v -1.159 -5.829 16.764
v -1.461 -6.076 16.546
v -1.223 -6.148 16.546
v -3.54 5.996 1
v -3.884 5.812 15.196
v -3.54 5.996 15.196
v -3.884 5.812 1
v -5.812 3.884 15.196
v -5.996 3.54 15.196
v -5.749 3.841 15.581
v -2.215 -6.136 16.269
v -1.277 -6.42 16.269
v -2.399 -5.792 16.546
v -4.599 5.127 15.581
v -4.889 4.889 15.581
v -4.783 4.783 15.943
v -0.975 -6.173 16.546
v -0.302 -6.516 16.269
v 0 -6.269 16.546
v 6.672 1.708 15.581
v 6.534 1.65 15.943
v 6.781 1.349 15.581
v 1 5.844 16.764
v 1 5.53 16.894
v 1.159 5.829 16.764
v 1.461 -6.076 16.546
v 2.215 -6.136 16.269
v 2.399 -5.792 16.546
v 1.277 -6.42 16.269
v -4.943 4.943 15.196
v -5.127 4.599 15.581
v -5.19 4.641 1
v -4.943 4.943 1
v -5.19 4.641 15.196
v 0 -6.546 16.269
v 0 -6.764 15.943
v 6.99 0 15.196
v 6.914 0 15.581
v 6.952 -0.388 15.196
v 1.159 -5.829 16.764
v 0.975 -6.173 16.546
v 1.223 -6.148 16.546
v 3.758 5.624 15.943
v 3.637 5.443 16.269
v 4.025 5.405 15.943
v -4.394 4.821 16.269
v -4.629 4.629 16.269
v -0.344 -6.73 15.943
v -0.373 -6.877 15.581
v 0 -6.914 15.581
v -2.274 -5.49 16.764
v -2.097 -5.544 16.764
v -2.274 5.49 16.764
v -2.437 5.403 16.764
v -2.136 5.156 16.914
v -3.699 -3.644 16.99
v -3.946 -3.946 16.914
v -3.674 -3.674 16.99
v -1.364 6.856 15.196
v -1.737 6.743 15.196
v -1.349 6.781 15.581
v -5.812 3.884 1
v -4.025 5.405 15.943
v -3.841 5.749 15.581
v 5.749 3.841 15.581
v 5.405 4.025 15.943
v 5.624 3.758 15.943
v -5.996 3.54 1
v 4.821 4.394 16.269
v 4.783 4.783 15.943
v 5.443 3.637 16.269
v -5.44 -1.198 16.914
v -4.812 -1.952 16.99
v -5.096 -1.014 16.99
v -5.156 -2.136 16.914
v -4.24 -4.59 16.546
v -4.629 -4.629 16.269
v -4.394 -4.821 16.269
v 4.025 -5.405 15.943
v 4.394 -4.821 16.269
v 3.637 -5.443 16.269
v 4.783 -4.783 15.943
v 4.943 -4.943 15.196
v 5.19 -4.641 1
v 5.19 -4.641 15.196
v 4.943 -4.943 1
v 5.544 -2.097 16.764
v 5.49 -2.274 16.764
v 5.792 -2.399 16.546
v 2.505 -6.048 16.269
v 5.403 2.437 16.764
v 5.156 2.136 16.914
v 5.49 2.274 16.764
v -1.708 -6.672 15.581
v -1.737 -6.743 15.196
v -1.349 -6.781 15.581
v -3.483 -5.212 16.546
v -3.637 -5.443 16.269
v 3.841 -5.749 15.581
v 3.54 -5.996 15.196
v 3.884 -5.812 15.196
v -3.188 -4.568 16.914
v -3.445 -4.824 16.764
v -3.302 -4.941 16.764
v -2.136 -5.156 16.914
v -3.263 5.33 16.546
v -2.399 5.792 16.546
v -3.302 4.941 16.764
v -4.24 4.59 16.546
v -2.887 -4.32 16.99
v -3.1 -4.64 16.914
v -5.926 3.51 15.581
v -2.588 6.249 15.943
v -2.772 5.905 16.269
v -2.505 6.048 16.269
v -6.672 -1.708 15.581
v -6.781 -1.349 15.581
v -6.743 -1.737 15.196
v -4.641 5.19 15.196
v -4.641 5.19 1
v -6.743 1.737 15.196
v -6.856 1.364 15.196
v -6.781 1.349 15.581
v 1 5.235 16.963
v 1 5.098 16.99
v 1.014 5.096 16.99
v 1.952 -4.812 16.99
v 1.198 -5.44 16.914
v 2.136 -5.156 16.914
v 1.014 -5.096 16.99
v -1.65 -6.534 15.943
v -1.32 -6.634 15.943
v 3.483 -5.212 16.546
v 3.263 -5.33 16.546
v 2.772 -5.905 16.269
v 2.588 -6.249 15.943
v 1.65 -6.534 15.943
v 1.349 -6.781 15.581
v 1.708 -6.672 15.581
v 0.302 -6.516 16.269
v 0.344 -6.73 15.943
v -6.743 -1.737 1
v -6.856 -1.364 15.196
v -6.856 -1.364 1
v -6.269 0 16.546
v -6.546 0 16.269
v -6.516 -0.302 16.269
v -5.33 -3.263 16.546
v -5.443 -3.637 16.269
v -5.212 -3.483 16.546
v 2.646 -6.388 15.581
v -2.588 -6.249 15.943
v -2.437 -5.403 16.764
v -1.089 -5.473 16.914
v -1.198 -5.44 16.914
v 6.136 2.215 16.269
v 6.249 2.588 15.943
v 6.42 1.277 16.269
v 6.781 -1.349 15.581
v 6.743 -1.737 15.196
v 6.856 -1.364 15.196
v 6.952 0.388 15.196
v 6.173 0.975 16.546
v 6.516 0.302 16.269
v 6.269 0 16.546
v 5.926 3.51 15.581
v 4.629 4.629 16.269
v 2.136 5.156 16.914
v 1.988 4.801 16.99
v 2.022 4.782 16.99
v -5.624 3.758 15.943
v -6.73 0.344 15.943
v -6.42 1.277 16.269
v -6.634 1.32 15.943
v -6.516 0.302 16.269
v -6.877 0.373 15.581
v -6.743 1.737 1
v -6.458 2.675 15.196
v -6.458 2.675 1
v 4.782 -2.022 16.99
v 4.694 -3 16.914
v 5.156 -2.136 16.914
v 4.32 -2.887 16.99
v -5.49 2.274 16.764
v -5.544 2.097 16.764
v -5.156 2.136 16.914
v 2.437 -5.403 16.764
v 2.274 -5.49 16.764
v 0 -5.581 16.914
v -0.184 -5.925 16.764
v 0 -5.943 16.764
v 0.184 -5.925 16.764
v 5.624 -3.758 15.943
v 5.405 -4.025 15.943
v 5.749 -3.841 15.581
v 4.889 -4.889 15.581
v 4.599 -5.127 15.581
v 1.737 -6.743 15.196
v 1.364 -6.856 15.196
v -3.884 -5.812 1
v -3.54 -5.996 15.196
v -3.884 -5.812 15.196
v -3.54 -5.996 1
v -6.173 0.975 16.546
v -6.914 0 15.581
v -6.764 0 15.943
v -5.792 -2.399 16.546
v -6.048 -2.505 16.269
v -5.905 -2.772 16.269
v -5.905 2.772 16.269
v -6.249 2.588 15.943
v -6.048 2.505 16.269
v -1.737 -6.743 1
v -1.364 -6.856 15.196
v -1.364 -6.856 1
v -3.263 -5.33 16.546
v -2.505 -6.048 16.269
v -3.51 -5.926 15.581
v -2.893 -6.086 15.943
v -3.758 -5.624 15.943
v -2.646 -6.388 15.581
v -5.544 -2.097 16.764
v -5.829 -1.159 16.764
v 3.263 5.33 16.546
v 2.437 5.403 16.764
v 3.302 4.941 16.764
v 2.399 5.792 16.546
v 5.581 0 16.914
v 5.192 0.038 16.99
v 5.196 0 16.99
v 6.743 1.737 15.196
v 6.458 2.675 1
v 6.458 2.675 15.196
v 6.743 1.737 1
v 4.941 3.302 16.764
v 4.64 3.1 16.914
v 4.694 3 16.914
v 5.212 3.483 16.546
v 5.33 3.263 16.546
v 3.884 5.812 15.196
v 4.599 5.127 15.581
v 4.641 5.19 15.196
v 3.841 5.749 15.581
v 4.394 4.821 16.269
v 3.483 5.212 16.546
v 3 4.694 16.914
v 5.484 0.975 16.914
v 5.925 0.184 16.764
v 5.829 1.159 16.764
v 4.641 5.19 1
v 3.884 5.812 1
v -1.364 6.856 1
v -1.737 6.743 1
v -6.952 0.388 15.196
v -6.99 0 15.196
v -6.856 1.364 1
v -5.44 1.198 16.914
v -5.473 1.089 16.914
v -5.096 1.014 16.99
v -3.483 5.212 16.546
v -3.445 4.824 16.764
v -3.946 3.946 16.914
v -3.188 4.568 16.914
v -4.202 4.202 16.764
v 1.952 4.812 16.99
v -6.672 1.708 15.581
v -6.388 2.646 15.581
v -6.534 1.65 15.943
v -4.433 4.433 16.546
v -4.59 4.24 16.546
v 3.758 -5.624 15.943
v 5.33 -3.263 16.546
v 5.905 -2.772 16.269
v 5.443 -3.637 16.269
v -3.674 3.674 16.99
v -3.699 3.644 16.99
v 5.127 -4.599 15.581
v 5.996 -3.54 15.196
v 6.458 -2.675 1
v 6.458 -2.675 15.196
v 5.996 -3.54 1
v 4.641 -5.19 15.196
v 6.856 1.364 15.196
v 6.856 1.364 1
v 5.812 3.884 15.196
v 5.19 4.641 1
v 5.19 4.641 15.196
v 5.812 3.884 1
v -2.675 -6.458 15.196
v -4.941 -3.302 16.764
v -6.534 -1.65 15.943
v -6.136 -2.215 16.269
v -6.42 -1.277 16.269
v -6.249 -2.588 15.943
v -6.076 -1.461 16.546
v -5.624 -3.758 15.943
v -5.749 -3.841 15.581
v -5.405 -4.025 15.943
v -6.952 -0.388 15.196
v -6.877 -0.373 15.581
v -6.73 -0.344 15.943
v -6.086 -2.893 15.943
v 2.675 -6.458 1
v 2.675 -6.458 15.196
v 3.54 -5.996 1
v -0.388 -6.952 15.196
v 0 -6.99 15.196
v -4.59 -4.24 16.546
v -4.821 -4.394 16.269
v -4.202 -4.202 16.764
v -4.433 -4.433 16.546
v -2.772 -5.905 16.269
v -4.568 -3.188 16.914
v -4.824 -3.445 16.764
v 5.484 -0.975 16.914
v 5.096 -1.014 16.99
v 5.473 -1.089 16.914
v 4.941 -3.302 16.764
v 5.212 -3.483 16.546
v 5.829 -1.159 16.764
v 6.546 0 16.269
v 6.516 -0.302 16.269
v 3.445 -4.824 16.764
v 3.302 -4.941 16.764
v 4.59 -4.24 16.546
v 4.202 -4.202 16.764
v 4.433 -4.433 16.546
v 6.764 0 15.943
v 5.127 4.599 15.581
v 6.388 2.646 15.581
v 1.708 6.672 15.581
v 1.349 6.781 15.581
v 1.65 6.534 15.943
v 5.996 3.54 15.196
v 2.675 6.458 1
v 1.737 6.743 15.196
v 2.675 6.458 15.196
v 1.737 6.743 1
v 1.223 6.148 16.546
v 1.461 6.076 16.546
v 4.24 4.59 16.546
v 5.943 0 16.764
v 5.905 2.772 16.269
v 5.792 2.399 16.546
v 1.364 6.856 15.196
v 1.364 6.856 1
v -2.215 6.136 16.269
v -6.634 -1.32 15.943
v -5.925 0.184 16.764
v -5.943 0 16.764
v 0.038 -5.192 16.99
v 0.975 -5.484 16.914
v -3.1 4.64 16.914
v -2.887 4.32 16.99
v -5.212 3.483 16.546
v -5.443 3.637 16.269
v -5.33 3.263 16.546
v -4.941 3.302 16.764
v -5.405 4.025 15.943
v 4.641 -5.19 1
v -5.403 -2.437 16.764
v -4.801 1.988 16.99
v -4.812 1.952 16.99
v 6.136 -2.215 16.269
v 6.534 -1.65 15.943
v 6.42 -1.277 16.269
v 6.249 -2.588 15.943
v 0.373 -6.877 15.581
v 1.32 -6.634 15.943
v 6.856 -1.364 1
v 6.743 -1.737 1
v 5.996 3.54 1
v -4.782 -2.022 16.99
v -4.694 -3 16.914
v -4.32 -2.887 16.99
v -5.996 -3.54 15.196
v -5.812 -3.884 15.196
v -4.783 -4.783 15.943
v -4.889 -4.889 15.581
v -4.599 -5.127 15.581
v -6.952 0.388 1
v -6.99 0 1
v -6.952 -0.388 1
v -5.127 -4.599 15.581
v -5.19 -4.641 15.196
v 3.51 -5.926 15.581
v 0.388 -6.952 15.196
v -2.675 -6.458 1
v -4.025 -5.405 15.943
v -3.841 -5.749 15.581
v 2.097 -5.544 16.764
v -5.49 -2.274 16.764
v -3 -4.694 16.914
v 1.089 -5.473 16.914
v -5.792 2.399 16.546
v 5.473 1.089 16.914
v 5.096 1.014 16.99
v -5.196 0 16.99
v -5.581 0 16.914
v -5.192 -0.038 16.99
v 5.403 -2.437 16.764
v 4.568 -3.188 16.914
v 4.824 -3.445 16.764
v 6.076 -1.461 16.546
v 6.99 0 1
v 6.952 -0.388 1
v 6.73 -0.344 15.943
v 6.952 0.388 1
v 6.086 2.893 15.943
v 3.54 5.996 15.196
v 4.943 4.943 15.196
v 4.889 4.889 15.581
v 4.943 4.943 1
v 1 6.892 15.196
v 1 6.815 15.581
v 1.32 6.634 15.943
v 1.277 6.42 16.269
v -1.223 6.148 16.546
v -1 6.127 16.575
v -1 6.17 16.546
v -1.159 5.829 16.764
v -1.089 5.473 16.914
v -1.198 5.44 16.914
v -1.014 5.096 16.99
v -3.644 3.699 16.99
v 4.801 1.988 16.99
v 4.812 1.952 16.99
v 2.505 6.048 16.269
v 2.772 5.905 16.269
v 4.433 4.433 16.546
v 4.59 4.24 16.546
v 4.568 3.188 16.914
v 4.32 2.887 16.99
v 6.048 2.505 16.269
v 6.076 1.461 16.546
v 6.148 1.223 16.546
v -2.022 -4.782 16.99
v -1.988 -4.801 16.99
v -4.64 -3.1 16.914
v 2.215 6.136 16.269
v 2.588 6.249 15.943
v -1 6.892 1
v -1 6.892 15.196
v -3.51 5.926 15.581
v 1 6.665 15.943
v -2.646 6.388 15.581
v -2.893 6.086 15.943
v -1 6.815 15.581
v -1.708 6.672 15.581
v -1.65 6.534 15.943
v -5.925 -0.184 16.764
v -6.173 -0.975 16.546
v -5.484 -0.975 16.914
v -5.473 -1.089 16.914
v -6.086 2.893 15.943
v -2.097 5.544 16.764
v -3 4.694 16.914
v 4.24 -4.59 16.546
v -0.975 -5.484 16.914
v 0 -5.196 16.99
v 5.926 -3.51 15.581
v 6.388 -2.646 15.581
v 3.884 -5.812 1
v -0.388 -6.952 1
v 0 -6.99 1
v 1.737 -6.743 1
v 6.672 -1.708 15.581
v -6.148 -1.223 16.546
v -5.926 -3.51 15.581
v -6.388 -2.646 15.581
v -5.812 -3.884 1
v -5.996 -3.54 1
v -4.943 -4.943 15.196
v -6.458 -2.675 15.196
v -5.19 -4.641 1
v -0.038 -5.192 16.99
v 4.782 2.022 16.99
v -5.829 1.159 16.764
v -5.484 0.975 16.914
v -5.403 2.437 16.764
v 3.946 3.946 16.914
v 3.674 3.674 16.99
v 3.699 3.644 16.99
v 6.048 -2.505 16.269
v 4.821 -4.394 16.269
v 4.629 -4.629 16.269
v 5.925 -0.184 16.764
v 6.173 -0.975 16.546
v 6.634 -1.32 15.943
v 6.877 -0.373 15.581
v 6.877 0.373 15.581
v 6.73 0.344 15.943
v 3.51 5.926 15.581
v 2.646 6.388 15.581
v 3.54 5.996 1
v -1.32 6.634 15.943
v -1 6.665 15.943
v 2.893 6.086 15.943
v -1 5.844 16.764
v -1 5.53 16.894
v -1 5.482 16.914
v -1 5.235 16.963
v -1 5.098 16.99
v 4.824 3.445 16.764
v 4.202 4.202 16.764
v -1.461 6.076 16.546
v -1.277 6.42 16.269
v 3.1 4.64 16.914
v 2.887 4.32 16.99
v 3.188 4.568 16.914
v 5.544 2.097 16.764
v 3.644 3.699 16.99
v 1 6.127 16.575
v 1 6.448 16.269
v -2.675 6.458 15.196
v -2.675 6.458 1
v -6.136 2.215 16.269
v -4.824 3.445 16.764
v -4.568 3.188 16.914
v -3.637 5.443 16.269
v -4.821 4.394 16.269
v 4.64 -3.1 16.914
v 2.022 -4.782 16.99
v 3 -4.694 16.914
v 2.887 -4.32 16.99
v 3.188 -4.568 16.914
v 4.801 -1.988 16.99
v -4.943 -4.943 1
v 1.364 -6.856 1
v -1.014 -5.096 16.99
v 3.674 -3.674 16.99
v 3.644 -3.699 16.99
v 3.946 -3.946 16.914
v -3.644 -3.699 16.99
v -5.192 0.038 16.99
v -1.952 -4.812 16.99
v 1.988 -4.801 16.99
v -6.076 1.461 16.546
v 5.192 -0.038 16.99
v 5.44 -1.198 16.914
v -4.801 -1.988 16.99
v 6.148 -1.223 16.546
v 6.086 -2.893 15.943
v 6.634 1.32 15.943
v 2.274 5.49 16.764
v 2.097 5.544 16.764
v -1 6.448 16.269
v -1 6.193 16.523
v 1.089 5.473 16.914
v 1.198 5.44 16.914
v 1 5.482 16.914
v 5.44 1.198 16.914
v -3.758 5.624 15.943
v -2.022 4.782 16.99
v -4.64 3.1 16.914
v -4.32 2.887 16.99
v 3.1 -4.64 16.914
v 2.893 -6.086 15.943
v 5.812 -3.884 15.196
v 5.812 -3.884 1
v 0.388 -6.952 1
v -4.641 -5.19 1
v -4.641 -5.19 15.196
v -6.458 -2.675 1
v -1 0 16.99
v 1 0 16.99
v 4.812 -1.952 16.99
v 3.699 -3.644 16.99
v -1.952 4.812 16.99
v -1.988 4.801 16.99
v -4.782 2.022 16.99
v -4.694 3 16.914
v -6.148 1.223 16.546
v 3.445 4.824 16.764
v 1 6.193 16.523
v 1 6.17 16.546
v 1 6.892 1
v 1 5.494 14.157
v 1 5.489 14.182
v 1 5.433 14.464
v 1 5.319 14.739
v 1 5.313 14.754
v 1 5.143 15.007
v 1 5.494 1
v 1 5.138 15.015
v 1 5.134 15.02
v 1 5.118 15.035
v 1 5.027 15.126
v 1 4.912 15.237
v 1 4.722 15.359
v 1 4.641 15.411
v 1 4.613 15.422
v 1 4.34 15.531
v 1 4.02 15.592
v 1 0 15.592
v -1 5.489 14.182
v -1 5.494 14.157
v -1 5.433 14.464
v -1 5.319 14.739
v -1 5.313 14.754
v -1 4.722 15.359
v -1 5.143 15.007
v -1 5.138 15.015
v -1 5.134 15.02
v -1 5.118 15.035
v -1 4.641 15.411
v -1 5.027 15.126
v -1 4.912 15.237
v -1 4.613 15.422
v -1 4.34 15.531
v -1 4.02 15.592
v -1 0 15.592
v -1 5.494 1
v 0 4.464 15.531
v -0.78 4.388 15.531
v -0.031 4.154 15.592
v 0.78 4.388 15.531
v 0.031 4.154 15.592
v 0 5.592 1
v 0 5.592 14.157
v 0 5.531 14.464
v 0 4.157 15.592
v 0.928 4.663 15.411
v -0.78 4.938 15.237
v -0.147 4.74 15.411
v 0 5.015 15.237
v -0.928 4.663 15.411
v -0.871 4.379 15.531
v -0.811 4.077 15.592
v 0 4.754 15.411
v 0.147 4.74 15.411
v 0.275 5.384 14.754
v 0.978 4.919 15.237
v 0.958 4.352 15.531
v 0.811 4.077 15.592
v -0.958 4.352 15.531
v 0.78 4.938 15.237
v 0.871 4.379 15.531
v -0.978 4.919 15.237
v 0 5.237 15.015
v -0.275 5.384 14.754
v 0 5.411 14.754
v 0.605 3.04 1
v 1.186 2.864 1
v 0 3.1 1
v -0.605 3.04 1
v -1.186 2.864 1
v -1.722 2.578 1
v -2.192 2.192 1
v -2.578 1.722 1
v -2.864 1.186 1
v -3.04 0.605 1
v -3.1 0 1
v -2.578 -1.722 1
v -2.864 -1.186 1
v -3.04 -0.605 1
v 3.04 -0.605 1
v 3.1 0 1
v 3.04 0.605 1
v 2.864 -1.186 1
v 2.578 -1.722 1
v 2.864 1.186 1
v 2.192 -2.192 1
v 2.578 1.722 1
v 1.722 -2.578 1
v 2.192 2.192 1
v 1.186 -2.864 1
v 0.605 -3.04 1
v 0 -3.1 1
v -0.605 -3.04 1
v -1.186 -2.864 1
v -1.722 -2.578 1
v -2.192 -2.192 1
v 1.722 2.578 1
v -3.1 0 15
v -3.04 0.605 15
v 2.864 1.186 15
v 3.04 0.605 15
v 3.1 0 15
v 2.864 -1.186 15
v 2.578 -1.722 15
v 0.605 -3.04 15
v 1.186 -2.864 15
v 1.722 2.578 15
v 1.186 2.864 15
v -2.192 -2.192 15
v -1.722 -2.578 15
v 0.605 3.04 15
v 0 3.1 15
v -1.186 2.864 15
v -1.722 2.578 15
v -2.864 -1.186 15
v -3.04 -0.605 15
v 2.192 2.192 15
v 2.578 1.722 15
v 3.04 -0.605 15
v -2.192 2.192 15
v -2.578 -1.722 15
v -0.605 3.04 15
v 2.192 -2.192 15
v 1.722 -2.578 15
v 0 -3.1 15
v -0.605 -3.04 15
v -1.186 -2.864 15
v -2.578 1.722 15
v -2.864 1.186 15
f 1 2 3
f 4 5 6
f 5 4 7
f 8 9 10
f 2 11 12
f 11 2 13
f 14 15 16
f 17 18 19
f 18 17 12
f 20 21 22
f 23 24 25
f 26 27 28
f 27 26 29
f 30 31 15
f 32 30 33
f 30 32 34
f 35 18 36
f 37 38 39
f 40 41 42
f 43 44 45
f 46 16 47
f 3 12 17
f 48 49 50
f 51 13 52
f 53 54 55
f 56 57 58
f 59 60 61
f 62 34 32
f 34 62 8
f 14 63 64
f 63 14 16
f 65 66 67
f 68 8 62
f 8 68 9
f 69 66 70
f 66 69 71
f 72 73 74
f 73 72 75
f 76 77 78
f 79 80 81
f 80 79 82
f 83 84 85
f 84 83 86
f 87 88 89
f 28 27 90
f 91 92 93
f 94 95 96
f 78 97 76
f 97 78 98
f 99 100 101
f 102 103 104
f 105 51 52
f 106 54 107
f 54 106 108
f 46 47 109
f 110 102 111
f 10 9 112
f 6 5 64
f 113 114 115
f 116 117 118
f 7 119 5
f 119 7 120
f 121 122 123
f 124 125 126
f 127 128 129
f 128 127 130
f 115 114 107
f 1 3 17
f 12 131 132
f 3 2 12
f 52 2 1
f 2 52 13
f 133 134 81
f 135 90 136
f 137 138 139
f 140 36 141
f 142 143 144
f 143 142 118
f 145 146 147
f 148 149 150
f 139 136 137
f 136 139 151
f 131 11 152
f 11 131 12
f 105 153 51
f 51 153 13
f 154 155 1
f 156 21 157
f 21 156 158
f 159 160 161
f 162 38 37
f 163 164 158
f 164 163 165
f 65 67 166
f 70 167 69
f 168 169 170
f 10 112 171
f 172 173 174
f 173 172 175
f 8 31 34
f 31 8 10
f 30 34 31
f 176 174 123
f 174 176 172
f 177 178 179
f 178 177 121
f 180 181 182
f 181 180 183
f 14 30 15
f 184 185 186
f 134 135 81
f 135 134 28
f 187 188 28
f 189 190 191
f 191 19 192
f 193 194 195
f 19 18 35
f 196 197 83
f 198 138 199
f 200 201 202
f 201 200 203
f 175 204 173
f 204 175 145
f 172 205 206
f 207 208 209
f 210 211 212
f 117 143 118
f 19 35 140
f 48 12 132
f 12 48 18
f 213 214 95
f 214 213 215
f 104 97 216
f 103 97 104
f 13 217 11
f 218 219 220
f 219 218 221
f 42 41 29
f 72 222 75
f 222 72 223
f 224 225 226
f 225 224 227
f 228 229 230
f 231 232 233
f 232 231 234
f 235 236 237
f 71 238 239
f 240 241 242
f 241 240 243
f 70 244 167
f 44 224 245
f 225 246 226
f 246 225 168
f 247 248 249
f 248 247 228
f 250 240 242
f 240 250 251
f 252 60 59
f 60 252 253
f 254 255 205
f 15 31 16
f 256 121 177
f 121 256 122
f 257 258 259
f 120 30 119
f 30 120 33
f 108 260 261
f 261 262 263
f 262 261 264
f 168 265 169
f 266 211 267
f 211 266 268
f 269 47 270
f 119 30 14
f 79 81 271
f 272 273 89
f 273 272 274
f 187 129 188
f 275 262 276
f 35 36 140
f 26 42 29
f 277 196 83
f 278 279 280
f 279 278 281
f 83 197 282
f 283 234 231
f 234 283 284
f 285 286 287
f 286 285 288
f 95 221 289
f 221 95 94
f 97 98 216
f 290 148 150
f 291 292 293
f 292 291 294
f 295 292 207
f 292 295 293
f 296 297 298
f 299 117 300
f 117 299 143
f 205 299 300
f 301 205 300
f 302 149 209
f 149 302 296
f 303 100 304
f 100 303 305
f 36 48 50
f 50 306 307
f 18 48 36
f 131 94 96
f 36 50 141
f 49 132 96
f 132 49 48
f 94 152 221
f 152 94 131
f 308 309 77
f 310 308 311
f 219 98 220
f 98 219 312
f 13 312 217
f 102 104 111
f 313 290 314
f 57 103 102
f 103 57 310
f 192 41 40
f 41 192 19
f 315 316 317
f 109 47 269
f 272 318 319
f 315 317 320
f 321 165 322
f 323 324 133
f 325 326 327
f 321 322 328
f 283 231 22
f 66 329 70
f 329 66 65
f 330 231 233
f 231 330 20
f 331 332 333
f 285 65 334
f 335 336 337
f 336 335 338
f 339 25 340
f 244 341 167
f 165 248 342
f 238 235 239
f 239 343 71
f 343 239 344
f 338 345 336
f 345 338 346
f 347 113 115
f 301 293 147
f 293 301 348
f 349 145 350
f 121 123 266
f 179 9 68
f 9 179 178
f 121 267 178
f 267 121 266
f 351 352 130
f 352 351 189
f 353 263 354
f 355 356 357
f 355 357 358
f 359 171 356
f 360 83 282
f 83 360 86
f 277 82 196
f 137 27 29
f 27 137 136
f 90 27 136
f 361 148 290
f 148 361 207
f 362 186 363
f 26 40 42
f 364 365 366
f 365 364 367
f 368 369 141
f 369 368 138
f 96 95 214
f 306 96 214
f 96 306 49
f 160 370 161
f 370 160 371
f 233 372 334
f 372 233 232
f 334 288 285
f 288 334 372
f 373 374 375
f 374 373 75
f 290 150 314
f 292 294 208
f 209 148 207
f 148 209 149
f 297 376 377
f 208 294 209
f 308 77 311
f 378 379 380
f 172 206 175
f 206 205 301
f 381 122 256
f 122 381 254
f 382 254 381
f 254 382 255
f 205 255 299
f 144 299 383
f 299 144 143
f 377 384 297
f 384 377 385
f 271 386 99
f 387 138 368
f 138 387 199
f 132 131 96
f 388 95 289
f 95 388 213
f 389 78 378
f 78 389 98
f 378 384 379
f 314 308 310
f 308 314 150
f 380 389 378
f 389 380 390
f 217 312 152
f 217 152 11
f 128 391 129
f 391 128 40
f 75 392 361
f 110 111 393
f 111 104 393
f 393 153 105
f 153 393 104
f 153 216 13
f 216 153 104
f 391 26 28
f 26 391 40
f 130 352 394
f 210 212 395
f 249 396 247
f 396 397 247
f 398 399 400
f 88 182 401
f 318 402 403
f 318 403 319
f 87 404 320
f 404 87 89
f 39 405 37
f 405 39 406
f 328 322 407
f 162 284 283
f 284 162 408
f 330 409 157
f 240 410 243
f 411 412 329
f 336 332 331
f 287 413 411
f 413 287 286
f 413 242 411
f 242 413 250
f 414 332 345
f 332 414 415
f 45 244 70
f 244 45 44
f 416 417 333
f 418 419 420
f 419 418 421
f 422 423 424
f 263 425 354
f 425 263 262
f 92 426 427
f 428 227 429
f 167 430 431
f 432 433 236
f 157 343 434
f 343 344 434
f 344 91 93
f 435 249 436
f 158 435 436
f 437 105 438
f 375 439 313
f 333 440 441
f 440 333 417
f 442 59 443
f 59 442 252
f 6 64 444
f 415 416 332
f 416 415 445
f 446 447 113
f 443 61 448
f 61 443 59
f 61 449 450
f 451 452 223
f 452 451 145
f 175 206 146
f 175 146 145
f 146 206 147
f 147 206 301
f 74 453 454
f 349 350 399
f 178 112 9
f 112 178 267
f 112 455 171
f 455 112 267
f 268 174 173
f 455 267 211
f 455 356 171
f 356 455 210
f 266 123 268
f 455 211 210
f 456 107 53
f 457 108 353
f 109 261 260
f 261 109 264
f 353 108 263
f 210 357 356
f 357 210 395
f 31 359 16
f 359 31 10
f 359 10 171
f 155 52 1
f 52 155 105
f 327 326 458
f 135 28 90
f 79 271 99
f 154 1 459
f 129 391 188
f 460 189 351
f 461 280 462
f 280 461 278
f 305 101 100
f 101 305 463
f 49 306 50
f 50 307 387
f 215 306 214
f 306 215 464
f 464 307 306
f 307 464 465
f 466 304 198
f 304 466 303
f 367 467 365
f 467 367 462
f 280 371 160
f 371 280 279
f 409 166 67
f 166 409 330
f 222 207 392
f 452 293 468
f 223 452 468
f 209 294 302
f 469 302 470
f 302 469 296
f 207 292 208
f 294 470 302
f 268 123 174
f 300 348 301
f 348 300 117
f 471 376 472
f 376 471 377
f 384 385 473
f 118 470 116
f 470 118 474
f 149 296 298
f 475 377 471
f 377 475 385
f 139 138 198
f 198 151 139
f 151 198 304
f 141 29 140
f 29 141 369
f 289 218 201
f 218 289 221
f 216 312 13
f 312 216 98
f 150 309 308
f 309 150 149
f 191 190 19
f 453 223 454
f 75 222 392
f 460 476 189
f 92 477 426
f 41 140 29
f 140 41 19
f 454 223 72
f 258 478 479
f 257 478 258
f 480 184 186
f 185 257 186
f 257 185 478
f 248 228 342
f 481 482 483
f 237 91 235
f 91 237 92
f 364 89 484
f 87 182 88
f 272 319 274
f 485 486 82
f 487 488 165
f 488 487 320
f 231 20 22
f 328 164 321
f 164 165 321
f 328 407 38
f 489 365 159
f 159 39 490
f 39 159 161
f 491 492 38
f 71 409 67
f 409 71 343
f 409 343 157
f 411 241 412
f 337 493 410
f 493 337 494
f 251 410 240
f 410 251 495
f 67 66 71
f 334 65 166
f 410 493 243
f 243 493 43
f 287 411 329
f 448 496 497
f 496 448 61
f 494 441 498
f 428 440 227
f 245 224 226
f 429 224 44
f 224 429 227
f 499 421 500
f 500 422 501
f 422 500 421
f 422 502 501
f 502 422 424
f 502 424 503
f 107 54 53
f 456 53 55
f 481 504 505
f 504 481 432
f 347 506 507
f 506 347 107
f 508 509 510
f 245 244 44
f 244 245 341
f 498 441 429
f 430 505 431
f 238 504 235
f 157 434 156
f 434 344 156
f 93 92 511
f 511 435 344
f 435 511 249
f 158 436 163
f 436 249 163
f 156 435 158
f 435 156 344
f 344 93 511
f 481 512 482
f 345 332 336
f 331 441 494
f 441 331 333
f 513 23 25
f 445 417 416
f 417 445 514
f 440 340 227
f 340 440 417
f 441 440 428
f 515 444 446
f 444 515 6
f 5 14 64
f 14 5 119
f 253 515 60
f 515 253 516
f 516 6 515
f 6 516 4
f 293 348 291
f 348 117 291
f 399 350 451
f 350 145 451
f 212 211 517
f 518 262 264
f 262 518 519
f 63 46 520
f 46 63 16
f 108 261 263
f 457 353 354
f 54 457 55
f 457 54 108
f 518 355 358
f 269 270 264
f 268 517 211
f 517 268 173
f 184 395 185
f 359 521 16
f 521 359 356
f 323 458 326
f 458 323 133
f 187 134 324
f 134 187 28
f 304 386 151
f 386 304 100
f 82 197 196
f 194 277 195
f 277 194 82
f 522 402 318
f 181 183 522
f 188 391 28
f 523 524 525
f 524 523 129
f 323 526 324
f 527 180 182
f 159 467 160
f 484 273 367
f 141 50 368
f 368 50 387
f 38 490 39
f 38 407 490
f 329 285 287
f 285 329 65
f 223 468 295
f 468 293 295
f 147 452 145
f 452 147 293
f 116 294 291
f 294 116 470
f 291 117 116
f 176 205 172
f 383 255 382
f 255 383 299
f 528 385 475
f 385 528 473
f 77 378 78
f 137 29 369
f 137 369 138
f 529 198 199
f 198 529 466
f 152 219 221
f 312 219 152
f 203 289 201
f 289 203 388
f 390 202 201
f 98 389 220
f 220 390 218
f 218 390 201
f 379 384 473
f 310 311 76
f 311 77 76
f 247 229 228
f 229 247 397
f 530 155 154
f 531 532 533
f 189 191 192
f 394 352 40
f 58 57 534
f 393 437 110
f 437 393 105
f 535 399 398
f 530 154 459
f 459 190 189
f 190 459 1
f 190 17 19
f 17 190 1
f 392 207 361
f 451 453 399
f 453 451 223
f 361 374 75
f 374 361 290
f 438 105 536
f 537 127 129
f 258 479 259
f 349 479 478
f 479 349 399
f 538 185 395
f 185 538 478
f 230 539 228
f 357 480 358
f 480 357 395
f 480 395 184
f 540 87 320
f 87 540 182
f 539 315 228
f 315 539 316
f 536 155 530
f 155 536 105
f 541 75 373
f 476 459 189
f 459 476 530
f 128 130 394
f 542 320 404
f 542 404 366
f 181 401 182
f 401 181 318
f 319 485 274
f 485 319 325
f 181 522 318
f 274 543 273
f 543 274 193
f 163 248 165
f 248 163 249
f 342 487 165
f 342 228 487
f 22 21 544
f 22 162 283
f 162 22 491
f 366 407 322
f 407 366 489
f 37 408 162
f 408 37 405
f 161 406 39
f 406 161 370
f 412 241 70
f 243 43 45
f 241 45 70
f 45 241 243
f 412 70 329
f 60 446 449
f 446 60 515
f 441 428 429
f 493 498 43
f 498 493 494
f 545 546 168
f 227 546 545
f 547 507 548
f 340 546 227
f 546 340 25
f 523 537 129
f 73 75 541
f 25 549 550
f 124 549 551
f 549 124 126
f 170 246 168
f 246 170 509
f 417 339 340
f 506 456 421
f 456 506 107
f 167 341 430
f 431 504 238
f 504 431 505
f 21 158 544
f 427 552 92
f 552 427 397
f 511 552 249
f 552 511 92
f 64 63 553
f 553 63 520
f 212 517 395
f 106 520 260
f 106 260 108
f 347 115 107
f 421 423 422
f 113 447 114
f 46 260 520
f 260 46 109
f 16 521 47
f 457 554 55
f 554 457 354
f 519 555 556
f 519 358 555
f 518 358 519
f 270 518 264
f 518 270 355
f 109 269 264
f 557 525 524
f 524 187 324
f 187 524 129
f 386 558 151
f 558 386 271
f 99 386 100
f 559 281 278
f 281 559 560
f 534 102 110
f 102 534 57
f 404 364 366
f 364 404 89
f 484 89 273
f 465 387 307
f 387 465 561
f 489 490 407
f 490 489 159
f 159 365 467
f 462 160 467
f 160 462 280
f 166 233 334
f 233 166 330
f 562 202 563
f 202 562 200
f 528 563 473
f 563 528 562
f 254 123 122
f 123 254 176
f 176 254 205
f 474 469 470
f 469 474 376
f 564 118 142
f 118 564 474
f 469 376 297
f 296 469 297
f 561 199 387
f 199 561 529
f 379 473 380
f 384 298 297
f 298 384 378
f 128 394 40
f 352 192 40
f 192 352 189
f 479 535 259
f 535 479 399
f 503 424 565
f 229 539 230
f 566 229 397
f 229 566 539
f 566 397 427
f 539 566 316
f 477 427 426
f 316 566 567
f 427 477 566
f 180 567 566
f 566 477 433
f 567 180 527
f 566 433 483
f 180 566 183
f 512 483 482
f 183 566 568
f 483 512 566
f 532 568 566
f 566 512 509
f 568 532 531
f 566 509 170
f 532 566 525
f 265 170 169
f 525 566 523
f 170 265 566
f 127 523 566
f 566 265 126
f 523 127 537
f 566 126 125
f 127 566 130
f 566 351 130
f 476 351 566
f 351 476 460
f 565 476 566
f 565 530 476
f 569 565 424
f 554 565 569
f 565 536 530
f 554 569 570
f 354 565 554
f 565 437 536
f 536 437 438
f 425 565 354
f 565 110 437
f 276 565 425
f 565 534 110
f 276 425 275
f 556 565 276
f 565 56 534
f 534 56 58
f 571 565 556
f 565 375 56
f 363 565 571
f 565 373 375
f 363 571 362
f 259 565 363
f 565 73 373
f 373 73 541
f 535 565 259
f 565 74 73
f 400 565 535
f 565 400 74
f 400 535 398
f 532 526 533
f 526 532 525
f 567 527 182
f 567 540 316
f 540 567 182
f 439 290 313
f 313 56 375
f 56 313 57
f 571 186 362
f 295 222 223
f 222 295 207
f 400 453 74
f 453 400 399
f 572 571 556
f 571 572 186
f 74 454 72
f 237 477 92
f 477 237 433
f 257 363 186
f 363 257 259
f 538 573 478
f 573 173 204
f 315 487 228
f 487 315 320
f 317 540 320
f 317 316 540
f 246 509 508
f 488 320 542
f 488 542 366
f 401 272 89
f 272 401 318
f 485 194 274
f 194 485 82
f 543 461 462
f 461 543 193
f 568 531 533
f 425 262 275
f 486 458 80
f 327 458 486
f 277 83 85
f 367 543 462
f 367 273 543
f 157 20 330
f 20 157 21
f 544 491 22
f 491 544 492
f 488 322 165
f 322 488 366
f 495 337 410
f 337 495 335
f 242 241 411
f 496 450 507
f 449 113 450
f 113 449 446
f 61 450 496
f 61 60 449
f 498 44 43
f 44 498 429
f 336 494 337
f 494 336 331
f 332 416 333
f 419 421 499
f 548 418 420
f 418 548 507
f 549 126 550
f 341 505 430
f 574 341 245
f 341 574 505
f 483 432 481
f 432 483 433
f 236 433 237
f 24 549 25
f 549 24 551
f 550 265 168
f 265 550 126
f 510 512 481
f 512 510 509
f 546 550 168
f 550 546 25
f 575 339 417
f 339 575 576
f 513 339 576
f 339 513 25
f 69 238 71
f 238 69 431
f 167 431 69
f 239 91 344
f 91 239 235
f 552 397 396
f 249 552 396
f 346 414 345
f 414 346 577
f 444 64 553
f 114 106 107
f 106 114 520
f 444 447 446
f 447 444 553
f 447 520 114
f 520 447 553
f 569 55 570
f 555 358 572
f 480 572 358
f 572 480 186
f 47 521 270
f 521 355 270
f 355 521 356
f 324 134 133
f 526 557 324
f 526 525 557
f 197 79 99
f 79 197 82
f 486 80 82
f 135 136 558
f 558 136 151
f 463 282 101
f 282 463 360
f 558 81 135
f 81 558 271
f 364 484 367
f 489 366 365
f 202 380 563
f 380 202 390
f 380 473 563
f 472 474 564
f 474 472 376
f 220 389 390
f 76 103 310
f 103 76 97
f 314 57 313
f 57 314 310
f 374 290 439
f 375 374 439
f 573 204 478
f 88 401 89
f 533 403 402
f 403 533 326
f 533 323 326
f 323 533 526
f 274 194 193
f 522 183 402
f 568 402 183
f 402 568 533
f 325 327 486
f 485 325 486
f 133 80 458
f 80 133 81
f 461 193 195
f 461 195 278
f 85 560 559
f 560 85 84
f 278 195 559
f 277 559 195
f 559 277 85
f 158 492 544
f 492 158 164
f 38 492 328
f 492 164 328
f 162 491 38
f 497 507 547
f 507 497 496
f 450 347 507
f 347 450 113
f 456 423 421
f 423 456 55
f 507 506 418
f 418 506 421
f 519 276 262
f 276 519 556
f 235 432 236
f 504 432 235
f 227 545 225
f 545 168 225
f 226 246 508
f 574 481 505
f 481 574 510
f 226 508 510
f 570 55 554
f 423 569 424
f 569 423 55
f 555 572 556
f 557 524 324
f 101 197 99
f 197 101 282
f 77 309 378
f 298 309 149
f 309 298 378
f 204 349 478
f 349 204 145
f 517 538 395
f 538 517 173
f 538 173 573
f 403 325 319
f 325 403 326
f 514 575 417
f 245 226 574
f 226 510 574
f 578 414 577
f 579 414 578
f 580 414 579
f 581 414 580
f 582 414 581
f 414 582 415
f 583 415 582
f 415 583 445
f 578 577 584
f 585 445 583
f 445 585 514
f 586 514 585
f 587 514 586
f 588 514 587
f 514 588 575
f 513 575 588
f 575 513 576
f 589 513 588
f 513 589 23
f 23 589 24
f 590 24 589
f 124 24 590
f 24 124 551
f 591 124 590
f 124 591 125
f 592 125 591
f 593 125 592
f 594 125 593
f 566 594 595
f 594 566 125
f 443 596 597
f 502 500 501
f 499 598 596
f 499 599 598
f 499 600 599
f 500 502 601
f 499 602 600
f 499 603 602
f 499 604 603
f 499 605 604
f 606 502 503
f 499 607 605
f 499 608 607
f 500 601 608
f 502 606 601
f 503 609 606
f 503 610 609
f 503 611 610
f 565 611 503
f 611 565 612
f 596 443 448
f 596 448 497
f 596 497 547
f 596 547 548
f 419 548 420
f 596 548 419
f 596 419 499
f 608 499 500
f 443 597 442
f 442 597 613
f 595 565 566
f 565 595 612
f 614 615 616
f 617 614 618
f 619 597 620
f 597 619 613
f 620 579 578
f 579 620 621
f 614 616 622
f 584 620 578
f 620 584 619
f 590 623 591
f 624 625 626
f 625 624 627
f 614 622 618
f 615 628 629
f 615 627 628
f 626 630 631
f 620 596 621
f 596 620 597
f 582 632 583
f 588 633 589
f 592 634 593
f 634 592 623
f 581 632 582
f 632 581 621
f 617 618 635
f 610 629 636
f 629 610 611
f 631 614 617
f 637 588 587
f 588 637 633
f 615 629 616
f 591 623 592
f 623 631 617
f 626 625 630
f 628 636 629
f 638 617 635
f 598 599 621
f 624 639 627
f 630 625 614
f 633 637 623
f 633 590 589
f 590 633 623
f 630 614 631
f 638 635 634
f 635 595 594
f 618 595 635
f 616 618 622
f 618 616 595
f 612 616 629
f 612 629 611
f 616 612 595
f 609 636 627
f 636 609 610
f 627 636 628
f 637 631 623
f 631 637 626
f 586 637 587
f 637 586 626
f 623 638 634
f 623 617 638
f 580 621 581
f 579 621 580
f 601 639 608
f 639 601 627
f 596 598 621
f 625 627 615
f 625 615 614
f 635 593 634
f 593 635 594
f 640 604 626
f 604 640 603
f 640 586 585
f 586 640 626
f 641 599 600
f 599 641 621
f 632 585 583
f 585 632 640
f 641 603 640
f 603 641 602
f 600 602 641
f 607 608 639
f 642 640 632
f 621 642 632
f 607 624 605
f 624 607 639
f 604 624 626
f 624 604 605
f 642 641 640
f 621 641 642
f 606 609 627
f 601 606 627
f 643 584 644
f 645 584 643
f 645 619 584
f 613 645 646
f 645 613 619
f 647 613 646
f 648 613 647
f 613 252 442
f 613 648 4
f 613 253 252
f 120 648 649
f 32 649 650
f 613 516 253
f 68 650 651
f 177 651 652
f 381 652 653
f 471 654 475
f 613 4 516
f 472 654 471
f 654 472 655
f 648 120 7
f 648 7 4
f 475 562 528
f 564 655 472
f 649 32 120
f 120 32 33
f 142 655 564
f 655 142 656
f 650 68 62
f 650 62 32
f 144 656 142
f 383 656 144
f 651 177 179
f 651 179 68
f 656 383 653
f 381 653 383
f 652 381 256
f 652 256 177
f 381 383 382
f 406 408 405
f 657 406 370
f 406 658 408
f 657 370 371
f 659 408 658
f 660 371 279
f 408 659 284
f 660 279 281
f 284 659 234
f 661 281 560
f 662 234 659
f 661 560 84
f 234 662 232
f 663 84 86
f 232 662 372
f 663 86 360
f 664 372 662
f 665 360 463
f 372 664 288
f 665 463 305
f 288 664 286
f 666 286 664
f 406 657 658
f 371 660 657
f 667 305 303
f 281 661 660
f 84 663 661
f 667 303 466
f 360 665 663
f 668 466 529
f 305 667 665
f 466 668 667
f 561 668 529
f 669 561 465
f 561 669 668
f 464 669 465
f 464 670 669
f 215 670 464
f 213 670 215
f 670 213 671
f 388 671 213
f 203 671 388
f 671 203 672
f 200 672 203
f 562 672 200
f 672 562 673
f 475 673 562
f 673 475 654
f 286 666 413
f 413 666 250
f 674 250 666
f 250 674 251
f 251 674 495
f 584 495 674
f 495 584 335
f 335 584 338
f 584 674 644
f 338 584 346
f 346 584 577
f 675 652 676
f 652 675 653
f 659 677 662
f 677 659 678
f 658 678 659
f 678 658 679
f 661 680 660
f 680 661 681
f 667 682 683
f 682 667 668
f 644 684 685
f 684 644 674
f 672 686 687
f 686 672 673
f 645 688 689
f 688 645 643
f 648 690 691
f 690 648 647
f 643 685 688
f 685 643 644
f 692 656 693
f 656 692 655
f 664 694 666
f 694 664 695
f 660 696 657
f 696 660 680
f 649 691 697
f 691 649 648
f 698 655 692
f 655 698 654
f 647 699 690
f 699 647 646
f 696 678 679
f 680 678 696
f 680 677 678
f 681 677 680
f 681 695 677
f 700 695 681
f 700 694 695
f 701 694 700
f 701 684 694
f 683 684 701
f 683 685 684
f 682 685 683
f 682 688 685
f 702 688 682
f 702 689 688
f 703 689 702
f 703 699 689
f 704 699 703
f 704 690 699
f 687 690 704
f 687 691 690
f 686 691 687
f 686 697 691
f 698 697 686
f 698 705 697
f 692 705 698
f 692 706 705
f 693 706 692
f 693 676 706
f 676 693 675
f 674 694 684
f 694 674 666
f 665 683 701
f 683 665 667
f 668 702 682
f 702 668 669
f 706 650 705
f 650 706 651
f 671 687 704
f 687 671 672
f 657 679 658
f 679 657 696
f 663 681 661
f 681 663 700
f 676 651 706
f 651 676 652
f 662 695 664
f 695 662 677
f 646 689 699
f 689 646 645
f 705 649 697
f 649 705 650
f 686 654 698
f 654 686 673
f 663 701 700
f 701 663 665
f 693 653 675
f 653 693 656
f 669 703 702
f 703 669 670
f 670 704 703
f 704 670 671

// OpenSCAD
/**
 * This work is licensed under a <a rel="license" href="https://creativecommons.org/licenses/by-sa/4.0/">Creative Commons Attribution 4.0 Unported License</a>.
 * You can find this on thingiverse: http://www.thingiverse.com/thing:1744562
 */

$fn=32;
difference() {
    union() {
        difference() {
            minkowski() {
                sphere(r=2);
                cylinder(r=5, h=15);
            }
            translate([0, 8.5, 8.5]) {
                cube([2, 17, 17], center=true);
            }
        }
        scale([0.8, 0.8, 0.8]) {
            minkowski() {
                sphere(r=2);
                cylinder(r=5, h=17.5);
            }
        }
    }
    translate([-10, -10, -3]) {
        cube([20, 20, 4]);
    }
    cylinder(r=3.1, h=15);
}
